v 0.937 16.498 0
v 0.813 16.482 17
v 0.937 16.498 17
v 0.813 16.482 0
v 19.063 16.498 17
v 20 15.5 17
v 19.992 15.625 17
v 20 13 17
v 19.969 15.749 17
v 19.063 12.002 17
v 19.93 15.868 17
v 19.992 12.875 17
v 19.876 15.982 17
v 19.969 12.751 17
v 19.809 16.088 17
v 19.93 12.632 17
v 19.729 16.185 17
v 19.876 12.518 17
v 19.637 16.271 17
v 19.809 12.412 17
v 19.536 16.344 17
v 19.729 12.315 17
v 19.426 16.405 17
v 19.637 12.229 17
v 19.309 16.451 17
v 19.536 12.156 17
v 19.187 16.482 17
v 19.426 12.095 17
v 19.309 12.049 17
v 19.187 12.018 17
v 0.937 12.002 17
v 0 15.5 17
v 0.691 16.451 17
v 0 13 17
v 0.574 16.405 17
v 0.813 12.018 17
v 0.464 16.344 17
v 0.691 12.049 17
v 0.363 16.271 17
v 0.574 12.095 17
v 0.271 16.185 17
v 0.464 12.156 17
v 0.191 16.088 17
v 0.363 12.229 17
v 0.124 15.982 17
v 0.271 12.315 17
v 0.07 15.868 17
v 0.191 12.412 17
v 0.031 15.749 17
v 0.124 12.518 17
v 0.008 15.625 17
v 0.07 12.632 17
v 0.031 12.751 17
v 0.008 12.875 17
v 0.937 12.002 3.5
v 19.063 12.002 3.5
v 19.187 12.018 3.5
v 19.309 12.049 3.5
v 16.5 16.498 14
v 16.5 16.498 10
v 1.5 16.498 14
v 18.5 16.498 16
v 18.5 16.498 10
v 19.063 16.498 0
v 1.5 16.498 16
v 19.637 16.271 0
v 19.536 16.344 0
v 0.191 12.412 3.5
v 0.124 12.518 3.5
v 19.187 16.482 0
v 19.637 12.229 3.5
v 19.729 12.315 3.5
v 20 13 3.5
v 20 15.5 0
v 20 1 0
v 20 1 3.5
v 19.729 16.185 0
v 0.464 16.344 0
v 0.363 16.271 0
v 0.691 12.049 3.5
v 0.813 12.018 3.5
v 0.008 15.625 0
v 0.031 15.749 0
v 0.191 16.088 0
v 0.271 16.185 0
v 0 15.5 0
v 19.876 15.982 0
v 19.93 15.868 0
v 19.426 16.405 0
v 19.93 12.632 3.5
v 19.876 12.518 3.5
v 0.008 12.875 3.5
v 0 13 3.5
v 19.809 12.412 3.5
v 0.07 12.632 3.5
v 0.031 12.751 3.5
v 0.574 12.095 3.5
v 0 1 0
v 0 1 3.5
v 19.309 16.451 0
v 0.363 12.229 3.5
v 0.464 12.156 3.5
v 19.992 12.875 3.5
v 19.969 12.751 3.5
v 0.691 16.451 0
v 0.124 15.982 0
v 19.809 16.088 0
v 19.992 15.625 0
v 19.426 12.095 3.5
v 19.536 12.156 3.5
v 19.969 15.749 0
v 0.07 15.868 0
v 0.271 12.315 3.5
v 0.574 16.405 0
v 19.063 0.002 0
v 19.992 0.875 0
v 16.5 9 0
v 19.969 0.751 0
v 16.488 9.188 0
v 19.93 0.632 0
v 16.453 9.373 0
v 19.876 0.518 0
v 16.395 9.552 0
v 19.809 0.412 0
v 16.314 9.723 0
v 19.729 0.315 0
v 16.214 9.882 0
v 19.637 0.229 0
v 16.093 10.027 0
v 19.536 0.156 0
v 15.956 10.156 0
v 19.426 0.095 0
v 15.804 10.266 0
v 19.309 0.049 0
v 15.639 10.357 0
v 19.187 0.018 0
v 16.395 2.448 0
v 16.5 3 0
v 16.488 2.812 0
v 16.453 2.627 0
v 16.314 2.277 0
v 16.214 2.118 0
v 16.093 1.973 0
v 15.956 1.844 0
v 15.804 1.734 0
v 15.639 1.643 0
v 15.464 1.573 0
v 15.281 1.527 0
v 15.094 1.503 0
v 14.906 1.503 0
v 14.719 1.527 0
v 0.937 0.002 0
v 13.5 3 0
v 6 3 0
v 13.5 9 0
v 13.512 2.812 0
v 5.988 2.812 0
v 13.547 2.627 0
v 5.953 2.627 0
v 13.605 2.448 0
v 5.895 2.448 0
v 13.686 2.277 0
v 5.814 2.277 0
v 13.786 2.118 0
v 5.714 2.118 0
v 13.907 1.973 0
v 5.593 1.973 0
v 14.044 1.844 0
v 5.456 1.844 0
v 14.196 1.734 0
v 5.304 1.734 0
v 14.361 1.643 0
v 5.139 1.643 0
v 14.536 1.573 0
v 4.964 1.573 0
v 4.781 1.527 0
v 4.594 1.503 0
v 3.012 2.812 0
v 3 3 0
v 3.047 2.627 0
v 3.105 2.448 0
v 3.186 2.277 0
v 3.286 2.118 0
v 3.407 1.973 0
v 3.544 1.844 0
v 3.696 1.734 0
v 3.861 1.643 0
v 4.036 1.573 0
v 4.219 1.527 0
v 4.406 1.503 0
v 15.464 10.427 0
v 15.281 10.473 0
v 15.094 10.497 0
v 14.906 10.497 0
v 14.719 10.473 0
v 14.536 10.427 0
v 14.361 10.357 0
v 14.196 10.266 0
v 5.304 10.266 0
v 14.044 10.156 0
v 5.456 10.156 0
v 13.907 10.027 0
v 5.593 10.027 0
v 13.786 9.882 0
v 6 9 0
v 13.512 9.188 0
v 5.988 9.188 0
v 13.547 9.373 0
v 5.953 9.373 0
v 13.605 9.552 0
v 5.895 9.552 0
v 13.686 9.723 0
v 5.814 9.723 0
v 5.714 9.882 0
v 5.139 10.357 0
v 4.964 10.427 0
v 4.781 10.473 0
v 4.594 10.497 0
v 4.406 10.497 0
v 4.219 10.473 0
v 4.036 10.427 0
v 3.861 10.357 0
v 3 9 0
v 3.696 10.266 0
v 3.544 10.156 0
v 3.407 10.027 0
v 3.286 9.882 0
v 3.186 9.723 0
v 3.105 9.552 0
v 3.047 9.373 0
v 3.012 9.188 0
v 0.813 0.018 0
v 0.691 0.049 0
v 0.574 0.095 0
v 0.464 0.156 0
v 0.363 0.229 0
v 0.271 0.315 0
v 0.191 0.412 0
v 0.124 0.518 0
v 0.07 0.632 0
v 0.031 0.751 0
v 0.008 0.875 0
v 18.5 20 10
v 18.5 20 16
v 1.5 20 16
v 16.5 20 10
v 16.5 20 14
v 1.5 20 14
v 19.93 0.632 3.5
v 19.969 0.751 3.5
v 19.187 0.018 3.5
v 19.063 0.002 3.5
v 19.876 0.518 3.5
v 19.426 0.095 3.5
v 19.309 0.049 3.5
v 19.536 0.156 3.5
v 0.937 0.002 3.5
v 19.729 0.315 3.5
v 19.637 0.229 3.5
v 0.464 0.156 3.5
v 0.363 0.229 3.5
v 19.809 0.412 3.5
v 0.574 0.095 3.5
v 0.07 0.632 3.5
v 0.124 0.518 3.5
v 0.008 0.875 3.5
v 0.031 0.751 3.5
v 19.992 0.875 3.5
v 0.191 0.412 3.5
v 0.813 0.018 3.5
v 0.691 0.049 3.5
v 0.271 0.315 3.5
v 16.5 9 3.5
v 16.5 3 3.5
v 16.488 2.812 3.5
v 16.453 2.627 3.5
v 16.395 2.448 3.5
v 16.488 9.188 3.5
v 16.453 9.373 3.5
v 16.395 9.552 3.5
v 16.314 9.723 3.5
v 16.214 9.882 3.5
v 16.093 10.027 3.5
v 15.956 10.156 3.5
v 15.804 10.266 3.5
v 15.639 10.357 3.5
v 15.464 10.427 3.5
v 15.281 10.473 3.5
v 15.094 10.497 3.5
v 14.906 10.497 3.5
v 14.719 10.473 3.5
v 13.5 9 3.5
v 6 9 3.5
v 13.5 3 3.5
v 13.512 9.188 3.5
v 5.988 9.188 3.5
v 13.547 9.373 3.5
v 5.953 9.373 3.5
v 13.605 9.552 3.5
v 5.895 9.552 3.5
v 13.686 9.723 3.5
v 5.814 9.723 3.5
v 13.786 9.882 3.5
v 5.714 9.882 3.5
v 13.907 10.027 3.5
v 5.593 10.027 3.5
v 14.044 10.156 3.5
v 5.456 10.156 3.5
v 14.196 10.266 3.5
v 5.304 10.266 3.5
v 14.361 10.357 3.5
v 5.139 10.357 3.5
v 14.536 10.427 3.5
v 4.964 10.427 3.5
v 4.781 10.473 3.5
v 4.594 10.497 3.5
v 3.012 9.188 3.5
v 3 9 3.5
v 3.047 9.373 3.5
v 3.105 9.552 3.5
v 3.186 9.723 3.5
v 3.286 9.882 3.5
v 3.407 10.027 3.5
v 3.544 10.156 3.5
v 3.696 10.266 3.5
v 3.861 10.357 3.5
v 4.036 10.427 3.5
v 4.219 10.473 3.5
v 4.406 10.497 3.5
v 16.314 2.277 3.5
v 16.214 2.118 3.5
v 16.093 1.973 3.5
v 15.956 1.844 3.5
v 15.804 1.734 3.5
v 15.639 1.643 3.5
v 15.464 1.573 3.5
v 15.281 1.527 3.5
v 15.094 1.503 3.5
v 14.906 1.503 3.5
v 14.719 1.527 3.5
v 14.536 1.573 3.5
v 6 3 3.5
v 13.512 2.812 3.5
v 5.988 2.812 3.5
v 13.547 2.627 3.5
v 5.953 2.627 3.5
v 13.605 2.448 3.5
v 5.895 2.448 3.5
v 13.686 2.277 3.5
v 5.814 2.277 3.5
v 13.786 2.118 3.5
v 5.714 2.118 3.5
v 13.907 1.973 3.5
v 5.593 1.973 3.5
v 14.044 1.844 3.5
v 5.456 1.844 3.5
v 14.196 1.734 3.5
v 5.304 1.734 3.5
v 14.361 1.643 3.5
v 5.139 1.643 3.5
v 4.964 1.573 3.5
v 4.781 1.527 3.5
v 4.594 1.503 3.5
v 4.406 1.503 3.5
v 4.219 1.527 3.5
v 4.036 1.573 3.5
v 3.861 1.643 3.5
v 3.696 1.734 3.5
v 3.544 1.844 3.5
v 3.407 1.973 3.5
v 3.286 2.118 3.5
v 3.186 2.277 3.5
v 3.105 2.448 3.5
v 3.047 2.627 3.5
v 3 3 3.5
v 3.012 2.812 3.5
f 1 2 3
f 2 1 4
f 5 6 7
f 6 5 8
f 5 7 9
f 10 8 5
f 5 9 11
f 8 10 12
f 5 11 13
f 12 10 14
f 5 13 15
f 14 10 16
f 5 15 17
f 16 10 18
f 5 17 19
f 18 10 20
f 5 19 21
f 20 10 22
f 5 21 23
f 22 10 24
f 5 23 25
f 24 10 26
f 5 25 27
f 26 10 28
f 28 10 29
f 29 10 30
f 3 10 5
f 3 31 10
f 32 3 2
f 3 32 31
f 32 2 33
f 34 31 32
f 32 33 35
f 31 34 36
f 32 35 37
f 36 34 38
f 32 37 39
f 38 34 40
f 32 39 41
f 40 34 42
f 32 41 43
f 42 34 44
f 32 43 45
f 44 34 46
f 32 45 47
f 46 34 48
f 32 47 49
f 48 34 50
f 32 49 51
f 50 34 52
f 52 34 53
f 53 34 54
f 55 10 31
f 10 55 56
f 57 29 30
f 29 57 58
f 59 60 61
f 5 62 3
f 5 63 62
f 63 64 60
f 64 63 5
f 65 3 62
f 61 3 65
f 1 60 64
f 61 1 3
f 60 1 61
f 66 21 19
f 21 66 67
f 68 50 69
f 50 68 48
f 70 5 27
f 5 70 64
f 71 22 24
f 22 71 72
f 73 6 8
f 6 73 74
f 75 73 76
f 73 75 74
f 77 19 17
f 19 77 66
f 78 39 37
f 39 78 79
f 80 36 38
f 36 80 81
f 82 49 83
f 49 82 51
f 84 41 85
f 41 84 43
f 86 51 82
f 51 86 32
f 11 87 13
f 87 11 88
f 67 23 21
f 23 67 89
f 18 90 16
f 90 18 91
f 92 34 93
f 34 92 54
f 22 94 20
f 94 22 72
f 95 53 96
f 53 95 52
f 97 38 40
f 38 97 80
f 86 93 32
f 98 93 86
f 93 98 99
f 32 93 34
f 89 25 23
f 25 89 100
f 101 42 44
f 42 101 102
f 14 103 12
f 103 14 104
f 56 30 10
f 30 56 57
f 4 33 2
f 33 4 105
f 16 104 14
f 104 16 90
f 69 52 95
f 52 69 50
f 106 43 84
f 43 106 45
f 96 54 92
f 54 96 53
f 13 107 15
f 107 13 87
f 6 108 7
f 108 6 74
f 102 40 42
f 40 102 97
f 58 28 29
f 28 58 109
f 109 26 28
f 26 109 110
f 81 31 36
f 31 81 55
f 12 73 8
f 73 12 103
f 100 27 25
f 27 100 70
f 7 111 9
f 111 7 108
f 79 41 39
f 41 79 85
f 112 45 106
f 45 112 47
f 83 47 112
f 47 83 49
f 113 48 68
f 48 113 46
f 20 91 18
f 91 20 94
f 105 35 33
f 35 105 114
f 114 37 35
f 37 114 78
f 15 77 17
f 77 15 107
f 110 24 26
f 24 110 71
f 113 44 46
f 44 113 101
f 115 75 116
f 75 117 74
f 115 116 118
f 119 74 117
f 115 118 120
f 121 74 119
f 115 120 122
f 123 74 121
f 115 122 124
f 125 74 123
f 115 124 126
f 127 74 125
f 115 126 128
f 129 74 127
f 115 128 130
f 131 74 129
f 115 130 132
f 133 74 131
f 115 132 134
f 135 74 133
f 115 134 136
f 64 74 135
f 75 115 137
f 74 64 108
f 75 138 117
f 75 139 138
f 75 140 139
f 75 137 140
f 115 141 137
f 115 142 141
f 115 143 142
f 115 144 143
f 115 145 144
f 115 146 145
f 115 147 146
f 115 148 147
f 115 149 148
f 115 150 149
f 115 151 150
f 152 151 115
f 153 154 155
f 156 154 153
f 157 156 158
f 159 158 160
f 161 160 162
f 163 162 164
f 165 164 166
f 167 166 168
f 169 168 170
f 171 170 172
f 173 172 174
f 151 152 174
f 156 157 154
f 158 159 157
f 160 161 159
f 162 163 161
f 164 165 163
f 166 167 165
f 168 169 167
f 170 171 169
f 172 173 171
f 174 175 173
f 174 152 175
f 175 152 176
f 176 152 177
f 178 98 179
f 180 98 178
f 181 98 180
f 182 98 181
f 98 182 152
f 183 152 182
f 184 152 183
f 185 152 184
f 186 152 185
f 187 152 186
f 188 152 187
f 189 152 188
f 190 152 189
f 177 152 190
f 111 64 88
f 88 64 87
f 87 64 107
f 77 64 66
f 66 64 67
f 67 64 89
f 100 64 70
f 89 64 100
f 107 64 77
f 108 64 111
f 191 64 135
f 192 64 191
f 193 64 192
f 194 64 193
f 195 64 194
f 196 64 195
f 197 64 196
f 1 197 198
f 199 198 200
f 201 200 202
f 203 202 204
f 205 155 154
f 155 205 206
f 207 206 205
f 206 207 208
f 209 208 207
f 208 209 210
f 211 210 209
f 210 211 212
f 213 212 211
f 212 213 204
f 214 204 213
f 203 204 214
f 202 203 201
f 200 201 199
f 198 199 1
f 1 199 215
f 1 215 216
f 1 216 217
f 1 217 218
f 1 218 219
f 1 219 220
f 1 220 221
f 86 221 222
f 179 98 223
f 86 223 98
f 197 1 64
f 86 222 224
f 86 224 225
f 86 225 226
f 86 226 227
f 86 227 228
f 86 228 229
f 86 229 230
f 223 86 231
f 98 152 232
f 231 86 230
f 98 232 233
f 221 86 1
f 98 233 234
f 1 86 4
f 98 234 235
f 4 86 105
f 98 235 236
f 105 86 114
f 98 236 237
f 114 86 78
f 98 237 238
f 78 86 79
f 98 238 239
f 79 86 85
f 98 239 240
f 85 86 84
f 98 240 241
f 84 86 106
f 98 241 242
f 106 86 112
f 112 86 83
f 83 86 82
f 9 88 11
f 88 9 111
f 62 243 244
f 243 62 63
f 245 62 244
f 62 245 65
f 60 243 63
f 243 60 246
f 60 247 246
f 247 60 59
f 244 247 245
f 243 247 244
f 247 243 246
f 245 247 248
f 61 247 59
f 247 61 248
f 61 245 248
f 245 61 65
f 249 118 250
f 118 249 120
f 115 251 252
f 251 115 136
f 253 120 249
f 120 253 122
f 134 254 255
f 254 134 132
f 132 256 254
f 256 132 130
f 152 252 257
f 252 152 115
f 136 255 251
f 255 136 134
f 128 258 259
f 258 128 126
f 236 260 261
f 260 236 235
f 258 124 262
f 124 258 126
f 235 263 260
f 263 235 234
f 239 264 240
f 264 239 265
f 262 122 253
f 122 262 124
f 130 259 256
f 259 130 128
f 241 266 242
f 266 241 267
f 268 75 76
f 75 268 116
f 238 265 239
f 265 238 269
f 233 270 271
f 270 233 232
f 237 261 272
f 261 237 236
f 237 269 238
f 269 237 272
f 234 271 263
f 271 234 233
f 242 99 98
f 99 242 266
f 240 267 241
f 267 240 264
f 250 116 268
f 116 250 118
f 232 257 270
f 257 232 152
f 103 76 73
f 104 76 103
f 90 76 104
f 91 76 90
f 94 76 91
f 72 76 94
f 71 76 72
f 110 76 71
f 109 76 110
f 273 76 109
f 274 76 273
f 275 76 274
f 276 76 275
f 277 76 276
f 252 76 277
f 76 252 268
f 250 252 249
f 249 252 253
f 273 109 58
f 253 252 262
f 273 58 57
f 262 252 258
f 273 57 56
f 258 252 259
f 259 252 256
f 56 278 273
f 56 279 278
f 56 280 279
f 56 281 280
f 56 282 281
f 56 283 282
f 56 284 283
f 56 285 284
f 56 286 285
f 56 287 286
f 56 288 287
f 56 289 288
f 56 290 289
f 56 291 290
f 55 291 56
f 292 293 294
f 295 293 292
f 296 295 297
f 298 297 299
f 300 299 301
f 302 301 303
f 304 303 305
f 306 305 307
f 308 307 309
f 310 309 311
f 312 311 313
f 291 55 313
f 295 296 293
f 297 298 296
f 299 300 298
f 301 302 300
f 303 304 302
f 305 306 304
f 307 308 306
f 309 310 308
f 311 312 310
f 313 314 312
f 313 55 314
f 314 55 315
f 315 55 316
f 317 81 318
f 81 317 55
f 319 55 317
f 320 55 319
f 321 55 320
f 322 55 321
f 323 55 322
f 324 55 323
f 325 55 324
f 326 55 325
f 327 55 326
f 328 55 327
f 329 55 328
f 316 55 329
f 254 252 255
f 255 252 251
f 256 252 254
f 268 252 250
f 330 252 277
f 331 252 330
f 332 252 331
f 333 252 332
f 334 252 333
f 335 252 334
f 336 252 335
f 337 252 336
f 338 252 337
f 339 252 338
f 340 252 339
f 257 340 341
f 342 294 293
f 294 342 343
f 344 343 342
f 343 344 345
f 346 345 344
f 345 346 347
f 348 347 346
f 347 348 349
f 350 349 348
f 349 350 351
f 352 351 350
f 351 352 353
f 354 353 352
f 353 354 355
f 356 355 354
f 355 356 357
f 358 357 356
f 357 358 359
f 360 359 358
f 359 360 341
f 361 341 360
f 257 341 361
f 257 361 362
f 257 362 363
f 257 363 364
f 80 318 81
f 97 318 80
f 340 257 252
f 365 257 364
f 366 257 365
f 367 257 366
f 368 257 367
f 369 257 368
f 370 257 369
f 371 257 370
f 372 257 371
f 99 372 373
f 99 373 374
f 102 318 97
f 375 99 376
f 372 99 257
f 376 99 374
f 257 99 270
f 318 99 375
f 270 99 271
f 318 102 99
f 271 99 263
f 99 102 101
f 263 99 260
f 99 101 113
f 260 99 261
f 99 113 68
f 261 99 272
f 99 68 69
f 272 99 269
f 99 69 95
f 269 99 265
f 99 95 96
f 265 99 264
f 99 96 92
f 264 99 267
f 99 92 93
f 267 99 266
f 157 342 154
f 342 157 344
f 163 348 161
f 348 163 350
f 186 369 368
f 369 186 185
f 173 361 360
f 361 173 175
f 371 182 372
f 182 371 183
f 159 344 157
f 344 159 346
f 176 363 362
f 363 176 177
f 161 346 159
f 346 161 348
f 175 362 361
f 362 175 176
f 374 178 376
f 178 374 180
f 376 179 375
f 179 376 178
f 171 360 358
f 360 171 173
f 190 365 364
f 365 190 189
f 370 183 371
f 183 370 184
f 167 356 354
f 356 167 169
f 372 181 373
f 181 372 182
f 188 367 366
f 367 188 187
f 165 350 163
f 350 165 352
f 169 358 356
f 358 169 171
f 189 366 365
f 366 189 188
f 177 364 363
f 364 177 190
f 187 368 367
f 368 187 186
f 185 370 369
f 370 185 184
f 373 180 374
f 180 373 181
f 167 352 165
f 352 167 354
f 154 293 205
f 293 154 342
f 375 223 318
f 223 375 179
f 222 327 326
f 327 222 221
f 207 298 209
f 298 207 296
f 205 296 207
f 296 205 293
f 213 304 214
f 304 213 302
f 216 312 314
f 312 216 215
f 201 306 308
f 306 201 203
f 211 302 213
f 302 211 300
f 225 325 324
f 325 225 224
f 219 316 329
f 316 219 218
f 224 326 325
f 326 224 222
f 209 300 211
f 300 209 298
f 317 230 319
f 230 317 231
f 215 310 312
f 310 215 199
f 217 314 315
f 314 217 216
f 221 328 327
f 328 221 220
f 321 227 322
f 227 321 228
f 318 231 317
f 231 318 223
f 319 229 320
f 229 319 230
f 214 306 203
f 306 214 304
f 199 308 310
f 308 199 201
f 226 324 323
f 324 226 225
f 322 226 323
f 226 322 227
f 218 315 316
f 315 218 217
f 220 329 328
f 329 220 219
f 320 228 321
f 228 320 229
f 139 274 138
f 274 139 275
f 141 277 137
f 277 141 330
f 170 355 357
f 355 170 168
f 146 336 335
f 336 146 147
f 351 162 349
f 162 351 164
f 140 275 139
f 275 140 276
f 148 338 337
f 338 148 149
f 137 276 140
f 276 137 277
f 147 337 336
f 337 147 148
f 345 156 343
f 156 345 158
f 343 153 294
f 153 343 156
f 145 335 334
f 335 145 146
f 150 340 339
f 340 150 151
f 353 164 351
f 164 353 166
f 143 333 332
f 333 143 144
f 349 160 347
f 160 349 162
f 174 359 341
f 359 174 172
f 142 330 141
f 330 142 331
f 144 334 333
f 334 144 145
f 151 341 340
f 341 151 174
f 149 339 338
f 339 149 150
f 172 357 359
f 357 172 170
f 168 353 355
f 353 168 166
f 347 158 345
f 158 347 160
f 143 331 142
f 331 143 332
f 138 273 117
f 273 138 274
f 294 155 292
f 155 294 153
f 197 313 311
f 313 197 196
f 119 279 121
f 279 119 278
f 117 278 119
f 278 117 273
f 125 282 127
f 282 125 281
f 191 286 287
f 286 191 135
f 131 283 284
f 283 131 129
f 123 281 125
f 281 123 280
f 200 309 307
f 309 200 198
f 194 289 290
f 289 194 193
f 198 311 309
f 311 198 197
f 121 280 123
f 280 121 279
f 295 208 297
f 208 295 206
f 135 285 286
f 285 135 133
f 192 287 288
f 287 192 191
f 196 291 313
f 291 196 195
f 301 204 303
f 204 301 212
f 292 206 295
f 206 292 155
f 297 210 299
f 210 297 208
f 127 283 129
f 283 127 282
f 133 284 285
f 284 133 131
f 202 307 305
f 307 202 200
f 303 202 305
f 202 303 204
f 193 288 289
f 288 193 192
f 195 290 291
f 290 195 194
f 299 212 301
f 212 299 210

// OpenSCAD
$fn=50;
difference() {
  translate([1,1]) color("green", 0.5) union() {
    minkowski() {
      cube([18,14,2.5]);
      cylinder(1);
    }

    translate([0,12]) union() { 
      minkowski() {
	cube([18,2.5,16]);
	cylinder(1);
      }
      translate([0.5,2,10]) %cube([2,5,6]);
      translate([15.5,2,10]) cube([2,5,6]);
      translate([0.5,2,14]) cube([17.0,5,2]);
    }

  }

  translate([4.5,3,-1]) oblongHole(6);
  translate([15,3,-1])  oblongHole(6);
}




module oblongHole(len) {
      union() {
//	//outer hole
//	translate([0,0,1+6.5-3]) {
//	  cylinder(h=4, r=5.5/2);
//	  translate([-5.5/2,0]) cube([5.5,len,4]);
//	  translate([0,len]) cylinder(h=4, r=5.5/2);
//	}	

	//inner hole
	cylinder(h=8, r=3/2);
	translate([-3/2,0]) cube([3,len,8]);
	translate([0,len]) cylinder(h=8, r=3/2);
      }


}
